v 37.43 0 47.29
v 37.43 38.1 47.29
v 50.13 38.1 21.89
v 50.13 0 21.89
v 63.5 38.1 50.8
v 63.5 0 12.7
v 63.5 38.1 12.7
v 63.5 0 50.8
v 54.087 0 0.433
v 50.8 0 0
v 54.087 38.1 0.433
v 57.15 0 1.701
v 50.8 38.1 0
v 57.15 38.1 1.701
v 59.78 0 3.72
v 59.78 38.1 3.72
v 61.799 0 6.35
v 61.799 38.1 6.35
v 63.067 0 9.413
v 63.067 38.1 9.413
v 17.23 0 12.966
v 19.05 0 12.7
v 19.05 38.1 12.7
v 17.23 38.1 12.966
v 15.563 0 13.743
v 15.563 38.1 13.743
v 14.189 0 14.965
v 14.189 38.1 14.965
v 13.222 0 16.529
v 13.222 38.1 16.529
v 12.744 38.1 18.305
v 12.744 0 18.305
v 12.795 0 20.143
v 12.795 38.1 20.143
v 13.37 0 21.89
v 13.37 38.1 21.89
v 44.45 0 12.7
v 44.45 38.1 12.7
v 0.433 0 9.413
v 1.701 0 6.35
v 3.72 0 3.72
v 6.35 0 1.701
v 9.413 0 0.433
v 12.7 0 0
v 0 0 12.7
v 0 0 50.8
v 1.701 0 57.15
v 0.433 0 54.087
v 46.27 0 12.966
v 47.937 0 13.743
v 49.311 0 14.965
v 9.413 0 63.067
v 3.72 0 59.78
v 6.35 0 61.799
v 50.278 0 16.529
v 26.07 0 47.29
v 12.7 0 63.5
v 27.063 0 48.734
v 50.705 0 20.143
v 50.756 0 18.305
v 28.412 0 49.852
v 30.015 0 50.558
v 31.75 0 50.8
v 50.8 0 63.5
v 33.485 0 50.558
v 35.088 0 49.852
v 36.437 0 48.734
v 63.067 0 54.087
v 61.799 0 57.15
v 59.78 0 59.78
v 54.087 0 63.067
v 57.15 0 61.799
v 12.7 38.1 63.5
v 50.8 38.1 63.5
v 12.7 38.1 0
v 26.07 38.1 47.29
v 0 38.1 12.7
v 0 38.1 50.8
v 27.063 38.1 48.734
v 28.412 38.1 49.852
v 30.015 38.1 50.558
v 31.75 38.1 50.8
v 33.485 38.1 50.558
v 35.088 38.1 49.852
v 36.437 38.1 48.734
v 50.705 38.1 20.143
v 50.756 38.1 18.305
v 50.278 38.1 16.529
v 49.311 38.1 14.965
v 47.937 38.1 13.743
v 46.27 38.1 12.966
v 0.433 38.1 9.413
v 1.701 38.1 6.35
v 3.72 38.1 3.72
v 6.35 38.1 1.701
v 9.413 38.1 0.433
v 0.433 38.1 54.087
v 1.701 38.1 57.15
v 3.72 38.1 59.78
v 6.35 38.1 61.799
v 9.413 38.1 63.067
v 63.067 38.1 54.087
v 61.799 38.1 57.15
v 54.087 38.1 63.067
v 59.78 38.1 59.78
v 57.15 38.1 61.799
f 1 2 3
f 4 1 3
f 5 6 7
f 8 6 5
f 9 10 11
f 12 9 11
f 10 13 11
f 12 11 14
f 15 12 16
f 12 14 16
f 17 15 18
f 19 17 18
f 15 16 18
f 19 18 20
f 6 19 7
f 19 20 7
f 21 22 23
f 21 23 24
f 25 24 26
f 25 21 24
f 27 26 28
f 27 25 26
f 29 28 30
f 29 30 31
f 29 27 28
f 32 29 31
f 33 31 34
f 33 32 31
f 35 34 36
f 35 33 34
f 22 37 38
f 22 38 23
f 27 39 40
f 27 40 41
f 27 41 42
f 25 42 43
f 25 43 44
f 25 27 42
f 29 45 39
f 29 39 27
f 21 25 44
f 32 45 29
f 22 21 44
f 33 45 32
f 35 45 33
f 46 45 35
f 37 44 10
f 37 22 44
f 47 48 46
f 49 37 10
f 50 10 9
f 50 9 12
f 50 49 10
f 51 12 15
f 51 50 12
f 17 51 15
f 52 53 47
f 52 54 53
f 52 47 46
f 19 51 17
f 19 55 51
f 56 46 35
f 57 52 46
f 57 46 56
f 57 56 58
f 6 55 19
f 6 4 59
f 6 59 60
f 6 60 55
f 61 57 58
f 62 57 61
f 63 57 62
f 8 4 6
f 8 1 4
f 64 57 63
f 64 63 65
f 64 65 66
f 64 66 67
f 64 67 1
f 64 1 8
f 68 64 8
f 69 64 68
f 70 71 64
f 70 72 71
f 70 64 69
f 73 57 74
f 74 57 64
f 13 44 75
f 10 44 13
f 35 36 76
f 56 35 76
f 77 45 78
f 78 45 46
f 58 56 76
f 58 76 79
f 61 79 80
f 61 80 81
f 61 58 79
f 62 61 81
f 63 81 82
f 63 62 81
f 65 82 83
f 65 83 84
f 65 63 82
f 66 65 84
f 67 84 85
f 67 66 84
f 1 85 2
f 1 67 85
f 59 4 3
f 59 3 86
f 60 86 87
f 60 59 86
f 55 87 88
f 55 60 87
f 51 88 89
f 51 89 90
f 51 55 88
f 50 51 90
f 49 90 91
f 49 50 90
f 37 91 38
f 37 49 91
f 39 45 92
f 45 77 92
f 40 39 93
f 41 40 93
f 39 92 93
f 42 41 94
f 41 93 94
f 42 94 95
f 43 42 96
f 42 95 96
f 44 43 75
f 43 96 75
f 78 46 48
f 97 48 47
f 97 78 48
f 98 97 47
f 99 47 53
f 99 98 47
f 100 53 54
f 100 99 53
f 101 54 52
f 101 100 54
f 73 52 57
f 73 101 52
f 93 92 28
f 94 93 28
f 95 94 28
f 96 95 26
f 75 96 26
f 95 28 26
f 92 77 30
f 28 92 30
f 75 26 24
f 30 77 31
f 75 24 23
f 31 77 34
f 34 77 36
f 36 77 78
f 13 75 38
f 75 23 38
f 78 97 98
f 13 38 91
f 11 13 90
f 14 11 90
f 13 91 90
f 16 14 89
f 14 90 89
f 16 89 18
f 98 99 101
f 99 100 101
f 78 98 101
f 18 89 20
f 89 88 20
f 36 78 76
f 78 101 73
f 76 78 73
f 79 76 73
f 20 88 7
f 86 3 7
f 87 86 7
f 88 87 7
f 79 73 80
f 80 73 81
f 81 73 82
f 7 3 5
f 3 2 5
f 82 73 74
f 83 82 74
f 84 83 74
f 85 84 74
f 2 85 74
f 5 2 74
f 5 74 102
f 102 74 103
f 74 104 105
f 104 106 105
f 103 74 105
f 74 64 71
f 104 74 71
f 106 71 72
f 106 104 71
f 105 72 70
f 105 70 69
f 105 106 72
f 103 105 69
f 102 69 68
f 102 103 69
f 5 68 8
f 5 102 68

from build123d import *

# Parameters (mm, degrees)
F0_W     = 63.5
F0_H     = 63.5
F1_DEPTH = 38.1
F2_R     = 12.7


with BuildPart() as f1:
    # F0 (on Front) → F1 (new body)
    with BuildSketch(Plane.XZ):
        with Locations((31.75, 31.75)):
            Rectangle(F0_W, F0_H)
        with BuildLine():
            ThreePointArc((19.05, 12.7), (13.648367, 15.711607), (13.370387, 21.889806))
            Line((13.370387, 21.889806), (26.070387, 47.289806))
            ThreePointArc((26.070387, 47.289806), (31.75, 50.8), (37.429613, 47.289806))
            Line((37.429613, 47.289806), (50.129613, 21.889806))
            ThreePointArc((50.129613, 21.889806), (49.851633, 15.711607), (44.45, 12.7))
            Line((44.45, 12.7), (19.05, 12.7))
        make_face(mode=Mode.SUBTRACT)
    extrude(amount=-F1_DEPTH)

    # F2
    f2_edges = [f1.edges().sort_by_distance(p)[0] for p in [
        (63.5, 19.05, 63.5),
        (63.5, 19.05, 0),
        (0, 19.05, 63.5),
        (0, 19.05, 0),
    ]]
    fillet(f2_edges, radius=F2_R)


solid = f1.part
